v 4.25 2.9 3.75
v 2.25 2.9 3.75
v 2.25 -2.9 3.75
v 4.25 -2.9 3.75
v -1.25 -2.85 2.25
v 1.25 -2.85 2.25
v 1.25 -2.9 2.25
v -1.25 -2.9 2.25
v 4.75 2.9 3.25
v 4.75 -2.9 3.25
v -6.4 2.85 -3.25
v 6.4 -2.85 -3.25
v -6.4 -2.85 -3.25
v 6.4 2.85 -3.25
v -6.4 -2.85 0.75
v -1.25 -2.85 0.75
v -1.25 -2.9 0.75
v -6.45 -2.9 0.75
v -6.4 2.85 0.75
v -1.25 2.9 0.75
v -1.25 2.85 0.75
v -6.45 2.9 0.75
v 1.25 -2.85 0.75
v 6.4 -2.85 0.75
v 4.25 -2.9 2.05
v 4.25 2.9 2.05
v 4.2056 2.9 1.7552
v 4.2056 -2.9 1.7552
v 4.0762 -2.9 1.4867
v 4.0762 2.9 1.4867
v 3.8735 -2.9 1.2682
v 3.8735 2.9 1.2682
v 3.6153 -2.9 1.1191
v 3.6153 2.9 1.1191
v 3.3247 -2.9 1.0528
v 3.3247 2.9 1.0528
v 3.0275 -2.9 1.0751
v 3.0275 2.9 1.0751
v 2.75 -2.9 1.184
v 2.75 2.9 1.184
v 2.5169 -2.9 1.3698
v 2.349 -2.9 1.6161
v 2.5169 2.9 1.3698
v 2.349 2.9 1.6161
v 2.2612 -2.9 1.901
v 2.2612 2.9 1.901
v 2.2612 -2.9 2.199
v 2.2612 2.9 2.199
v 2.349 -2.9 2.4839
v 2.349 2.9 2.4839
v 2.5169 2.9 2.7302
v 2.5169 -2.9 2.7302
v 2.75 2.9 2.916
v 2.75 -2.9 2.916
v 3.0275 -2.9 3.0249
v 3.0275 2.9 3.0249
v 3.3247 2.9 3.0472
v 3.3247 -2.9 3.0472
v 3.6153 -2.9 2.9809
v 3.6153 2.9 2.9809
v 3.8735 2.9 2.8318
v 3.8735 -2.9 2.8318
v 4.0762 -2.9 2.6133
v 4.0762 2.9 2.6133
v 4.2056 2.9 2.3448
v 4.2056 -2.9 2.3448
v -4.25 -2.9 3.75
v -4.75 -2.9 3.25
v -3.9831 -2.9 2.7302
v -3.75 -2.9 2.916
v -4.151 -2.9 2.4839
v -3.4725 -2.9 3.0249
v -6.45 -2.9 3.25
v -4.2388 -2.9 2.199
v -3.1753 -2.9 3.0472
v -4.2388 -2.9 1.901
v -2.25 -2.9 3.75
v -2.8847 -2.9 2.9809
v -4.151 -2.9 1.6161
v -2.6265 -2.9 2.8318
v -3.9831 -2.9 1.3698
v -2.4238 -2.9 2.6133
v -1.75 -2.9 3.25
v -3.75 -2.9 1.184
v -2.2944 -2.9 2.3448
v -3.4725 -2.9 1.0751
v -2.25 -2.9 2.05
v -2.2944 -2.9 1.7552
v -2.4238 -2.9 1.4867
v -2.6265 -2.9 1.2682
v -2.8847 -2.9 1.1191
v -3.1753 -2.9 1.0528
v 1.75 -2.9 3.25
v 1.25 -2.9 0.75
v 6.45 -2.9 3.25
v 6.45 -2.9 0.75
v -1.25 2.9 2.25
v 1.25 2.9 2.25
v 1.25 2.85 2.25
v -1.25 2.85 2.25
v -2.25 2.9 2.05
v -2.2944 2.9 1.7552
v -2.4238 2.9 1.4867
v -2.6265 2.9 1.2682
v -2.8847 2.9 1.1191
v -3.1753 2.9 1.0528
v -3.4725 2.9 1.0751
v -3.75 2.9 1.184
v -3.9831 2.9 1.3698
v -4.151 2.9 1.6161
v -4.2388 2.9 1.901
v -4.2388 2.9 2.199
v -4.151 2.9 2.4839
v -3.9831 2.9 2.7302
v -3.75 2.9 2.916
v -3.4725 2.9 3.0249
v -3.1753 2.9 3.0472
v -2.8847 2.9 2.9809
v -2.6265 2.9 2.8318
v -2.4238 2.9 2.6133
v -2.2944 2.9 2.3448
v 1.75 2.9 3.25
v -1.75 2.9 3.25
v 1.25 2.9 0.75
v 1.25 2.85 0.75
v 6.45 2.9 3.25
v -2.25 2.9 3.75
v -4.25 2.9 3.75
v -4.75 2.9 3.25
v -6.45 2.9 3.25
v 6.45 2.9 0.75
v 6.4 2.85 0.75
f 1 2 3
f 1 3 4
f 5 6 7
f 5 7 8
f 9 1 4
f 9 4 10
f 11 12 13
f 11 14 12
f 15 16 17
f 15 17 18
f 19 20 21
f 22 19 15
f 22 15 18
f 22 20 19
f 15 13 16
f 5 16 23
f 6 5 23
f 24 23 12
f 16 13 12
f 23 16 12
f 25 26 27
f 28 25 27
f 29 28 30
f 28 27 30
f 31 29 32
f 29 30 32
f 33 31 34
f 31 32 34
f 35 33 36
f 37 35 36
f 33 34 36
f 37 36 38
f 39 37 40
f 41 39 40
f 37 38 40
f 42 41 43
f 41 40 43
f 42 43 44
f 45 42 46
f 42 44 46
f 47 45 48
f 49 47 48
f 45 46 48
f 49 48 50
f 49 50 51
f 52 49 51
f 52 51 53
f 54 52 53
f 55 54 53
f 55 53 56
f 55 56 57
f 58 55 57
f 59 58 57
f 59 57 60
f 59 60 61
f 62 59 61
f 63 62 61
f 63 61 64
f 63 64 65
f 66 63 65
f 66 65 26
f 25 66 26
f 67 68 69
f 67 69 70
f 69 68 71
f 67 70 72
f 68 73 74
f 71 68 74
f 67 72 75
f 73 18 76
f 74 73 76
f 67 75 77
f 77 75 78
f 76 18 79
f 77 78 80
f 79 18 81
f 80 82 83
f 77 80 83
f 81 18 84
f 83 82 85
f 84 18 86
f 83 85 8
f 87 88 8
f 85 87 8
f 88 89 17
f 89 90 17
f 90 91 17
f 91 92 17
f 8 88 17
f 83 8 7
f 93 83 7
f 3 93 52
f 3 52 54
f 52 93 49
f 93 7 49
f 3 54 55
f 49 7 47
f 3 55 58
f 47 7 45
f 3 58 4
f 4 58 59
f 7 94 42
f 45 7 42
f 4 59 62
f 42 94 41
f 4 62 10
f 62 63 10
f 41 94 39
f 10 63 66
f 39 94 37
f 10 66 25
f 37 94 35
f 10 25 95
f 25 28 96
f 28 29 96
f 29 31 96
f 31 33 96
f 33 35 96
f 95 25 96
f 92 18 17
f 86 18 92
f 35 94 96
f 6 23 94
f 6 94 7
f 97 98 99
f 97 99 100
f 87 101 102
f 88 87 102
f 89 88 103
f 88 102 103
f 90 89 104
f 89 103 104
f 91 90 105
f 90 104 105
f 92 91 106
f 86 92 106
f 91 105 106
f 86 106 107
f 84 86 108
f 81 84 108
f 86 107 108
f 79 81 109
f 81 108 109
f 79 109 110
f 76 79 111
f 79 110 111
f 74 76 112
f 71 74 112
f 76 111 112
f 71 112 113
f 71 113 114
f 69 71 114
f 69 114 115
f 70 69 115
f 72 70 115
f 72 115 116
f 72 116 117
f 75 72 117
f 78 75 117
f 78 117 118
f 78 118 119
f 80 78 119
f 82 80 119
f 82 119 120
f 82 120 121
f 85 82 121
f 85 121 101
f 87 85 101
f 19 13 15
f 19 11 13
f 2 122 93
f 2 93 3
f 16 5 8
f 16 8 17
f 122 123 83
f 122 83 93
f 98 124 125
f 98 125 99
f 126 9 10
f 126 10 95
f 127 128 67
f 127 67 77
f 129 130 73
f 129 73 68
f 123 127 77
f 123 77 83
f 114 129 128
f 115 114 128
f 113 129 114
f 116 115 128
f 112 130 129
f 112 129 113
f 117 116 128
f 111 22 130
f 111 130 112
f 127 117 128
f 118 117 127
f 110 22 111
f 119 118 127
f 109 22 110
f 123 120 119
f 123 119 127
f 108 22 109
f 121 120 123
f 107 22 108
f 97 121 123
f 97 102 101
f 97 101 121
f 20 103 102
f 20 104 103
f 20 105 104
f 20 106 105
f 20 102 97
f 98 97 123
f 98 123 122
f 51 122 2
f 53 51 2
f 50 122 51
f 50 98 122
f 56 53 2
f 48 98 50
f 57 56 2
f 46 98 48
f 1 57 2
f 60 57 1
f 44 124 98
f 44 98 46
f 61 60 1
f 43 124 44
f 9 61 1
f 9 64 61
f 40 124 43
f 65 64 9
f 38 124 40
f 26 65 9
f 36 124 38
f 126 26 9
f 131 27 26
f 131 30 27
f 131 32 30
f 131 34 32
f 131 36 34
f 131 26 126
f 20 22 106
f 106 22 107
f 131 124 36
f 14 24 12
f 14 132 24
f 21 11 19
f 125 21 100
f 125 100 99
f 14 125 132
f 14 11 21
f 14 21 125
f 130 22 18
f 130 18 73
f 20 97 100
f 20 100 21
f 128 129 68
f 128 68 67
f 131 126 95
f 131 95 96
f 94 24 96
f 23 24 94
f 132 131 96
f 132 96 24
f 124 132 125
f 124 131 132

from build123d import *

# Parameters (mm, degrees)
BOSS_EXTRUDE1_DEPTH   = 2.85
BOSS_EXTRUDE2_DEPTH   = 2.9
F_2_0MM_DOWEL_HOLE1_D = 2


with BuildPart() as part:
    # Sketch1 → Boss-Extrude1 (new, symmetric)
    with BuildSketch(Plane(origin=(0, 0, 0), x_dir=(1, 0, 0), z_dir=(0, 1, 0))):
        Polygon((-6.4, 3.25), (-6.4, -0.75), (-1.25, -0.75), (-1.25, -2.25), (1.25, -2.25), (1.25, -0.75), (6.4, -0.75), (6.4, 3.25), align=None)
    extrude(amount=BOSS_EXTRUDE1_DEPTH, both=True)

    # Sketch1<3> → Boss-Extrude2 (add, symmetric)
    with BuildSketch(Plane(origin=(0, 0, 0), x_dir=(1, 0, 0), z_dir=(0, 1, 0))):
        Polygon((-1.25, -0.75), (-6.45, -0.75), (-6.45, -3.25), (-4.75, -3.25), (-4.25, -3.75), (-2.25, -3.75), (-1.75, -3.25), (1.75, -3.25), (2.25, -3.75), (4.25, -3.75), (4.75, -3.25), (6.45, -3.25), (6.45, -0.75), (1.25, -0.75), (1.25, -2.25), (-1.25, -2.25), align=None)
    extrude(amount=BOSS_EXTRUDE2_DEPTH, both=True)

    # Ø2.0mm Dowel Hole1 (through all)
    with Locations(Plane(origin=(0, -2.9, 0), x_dir=(-1, 0, 0), z_dir=(0, -1, 0))):
        with Locations((3.25, -2.05), (-3.25, -2.05)):
            Hole(F_2_0MM_DOWEL_HOLE1_D / 2)


solid = part.part
